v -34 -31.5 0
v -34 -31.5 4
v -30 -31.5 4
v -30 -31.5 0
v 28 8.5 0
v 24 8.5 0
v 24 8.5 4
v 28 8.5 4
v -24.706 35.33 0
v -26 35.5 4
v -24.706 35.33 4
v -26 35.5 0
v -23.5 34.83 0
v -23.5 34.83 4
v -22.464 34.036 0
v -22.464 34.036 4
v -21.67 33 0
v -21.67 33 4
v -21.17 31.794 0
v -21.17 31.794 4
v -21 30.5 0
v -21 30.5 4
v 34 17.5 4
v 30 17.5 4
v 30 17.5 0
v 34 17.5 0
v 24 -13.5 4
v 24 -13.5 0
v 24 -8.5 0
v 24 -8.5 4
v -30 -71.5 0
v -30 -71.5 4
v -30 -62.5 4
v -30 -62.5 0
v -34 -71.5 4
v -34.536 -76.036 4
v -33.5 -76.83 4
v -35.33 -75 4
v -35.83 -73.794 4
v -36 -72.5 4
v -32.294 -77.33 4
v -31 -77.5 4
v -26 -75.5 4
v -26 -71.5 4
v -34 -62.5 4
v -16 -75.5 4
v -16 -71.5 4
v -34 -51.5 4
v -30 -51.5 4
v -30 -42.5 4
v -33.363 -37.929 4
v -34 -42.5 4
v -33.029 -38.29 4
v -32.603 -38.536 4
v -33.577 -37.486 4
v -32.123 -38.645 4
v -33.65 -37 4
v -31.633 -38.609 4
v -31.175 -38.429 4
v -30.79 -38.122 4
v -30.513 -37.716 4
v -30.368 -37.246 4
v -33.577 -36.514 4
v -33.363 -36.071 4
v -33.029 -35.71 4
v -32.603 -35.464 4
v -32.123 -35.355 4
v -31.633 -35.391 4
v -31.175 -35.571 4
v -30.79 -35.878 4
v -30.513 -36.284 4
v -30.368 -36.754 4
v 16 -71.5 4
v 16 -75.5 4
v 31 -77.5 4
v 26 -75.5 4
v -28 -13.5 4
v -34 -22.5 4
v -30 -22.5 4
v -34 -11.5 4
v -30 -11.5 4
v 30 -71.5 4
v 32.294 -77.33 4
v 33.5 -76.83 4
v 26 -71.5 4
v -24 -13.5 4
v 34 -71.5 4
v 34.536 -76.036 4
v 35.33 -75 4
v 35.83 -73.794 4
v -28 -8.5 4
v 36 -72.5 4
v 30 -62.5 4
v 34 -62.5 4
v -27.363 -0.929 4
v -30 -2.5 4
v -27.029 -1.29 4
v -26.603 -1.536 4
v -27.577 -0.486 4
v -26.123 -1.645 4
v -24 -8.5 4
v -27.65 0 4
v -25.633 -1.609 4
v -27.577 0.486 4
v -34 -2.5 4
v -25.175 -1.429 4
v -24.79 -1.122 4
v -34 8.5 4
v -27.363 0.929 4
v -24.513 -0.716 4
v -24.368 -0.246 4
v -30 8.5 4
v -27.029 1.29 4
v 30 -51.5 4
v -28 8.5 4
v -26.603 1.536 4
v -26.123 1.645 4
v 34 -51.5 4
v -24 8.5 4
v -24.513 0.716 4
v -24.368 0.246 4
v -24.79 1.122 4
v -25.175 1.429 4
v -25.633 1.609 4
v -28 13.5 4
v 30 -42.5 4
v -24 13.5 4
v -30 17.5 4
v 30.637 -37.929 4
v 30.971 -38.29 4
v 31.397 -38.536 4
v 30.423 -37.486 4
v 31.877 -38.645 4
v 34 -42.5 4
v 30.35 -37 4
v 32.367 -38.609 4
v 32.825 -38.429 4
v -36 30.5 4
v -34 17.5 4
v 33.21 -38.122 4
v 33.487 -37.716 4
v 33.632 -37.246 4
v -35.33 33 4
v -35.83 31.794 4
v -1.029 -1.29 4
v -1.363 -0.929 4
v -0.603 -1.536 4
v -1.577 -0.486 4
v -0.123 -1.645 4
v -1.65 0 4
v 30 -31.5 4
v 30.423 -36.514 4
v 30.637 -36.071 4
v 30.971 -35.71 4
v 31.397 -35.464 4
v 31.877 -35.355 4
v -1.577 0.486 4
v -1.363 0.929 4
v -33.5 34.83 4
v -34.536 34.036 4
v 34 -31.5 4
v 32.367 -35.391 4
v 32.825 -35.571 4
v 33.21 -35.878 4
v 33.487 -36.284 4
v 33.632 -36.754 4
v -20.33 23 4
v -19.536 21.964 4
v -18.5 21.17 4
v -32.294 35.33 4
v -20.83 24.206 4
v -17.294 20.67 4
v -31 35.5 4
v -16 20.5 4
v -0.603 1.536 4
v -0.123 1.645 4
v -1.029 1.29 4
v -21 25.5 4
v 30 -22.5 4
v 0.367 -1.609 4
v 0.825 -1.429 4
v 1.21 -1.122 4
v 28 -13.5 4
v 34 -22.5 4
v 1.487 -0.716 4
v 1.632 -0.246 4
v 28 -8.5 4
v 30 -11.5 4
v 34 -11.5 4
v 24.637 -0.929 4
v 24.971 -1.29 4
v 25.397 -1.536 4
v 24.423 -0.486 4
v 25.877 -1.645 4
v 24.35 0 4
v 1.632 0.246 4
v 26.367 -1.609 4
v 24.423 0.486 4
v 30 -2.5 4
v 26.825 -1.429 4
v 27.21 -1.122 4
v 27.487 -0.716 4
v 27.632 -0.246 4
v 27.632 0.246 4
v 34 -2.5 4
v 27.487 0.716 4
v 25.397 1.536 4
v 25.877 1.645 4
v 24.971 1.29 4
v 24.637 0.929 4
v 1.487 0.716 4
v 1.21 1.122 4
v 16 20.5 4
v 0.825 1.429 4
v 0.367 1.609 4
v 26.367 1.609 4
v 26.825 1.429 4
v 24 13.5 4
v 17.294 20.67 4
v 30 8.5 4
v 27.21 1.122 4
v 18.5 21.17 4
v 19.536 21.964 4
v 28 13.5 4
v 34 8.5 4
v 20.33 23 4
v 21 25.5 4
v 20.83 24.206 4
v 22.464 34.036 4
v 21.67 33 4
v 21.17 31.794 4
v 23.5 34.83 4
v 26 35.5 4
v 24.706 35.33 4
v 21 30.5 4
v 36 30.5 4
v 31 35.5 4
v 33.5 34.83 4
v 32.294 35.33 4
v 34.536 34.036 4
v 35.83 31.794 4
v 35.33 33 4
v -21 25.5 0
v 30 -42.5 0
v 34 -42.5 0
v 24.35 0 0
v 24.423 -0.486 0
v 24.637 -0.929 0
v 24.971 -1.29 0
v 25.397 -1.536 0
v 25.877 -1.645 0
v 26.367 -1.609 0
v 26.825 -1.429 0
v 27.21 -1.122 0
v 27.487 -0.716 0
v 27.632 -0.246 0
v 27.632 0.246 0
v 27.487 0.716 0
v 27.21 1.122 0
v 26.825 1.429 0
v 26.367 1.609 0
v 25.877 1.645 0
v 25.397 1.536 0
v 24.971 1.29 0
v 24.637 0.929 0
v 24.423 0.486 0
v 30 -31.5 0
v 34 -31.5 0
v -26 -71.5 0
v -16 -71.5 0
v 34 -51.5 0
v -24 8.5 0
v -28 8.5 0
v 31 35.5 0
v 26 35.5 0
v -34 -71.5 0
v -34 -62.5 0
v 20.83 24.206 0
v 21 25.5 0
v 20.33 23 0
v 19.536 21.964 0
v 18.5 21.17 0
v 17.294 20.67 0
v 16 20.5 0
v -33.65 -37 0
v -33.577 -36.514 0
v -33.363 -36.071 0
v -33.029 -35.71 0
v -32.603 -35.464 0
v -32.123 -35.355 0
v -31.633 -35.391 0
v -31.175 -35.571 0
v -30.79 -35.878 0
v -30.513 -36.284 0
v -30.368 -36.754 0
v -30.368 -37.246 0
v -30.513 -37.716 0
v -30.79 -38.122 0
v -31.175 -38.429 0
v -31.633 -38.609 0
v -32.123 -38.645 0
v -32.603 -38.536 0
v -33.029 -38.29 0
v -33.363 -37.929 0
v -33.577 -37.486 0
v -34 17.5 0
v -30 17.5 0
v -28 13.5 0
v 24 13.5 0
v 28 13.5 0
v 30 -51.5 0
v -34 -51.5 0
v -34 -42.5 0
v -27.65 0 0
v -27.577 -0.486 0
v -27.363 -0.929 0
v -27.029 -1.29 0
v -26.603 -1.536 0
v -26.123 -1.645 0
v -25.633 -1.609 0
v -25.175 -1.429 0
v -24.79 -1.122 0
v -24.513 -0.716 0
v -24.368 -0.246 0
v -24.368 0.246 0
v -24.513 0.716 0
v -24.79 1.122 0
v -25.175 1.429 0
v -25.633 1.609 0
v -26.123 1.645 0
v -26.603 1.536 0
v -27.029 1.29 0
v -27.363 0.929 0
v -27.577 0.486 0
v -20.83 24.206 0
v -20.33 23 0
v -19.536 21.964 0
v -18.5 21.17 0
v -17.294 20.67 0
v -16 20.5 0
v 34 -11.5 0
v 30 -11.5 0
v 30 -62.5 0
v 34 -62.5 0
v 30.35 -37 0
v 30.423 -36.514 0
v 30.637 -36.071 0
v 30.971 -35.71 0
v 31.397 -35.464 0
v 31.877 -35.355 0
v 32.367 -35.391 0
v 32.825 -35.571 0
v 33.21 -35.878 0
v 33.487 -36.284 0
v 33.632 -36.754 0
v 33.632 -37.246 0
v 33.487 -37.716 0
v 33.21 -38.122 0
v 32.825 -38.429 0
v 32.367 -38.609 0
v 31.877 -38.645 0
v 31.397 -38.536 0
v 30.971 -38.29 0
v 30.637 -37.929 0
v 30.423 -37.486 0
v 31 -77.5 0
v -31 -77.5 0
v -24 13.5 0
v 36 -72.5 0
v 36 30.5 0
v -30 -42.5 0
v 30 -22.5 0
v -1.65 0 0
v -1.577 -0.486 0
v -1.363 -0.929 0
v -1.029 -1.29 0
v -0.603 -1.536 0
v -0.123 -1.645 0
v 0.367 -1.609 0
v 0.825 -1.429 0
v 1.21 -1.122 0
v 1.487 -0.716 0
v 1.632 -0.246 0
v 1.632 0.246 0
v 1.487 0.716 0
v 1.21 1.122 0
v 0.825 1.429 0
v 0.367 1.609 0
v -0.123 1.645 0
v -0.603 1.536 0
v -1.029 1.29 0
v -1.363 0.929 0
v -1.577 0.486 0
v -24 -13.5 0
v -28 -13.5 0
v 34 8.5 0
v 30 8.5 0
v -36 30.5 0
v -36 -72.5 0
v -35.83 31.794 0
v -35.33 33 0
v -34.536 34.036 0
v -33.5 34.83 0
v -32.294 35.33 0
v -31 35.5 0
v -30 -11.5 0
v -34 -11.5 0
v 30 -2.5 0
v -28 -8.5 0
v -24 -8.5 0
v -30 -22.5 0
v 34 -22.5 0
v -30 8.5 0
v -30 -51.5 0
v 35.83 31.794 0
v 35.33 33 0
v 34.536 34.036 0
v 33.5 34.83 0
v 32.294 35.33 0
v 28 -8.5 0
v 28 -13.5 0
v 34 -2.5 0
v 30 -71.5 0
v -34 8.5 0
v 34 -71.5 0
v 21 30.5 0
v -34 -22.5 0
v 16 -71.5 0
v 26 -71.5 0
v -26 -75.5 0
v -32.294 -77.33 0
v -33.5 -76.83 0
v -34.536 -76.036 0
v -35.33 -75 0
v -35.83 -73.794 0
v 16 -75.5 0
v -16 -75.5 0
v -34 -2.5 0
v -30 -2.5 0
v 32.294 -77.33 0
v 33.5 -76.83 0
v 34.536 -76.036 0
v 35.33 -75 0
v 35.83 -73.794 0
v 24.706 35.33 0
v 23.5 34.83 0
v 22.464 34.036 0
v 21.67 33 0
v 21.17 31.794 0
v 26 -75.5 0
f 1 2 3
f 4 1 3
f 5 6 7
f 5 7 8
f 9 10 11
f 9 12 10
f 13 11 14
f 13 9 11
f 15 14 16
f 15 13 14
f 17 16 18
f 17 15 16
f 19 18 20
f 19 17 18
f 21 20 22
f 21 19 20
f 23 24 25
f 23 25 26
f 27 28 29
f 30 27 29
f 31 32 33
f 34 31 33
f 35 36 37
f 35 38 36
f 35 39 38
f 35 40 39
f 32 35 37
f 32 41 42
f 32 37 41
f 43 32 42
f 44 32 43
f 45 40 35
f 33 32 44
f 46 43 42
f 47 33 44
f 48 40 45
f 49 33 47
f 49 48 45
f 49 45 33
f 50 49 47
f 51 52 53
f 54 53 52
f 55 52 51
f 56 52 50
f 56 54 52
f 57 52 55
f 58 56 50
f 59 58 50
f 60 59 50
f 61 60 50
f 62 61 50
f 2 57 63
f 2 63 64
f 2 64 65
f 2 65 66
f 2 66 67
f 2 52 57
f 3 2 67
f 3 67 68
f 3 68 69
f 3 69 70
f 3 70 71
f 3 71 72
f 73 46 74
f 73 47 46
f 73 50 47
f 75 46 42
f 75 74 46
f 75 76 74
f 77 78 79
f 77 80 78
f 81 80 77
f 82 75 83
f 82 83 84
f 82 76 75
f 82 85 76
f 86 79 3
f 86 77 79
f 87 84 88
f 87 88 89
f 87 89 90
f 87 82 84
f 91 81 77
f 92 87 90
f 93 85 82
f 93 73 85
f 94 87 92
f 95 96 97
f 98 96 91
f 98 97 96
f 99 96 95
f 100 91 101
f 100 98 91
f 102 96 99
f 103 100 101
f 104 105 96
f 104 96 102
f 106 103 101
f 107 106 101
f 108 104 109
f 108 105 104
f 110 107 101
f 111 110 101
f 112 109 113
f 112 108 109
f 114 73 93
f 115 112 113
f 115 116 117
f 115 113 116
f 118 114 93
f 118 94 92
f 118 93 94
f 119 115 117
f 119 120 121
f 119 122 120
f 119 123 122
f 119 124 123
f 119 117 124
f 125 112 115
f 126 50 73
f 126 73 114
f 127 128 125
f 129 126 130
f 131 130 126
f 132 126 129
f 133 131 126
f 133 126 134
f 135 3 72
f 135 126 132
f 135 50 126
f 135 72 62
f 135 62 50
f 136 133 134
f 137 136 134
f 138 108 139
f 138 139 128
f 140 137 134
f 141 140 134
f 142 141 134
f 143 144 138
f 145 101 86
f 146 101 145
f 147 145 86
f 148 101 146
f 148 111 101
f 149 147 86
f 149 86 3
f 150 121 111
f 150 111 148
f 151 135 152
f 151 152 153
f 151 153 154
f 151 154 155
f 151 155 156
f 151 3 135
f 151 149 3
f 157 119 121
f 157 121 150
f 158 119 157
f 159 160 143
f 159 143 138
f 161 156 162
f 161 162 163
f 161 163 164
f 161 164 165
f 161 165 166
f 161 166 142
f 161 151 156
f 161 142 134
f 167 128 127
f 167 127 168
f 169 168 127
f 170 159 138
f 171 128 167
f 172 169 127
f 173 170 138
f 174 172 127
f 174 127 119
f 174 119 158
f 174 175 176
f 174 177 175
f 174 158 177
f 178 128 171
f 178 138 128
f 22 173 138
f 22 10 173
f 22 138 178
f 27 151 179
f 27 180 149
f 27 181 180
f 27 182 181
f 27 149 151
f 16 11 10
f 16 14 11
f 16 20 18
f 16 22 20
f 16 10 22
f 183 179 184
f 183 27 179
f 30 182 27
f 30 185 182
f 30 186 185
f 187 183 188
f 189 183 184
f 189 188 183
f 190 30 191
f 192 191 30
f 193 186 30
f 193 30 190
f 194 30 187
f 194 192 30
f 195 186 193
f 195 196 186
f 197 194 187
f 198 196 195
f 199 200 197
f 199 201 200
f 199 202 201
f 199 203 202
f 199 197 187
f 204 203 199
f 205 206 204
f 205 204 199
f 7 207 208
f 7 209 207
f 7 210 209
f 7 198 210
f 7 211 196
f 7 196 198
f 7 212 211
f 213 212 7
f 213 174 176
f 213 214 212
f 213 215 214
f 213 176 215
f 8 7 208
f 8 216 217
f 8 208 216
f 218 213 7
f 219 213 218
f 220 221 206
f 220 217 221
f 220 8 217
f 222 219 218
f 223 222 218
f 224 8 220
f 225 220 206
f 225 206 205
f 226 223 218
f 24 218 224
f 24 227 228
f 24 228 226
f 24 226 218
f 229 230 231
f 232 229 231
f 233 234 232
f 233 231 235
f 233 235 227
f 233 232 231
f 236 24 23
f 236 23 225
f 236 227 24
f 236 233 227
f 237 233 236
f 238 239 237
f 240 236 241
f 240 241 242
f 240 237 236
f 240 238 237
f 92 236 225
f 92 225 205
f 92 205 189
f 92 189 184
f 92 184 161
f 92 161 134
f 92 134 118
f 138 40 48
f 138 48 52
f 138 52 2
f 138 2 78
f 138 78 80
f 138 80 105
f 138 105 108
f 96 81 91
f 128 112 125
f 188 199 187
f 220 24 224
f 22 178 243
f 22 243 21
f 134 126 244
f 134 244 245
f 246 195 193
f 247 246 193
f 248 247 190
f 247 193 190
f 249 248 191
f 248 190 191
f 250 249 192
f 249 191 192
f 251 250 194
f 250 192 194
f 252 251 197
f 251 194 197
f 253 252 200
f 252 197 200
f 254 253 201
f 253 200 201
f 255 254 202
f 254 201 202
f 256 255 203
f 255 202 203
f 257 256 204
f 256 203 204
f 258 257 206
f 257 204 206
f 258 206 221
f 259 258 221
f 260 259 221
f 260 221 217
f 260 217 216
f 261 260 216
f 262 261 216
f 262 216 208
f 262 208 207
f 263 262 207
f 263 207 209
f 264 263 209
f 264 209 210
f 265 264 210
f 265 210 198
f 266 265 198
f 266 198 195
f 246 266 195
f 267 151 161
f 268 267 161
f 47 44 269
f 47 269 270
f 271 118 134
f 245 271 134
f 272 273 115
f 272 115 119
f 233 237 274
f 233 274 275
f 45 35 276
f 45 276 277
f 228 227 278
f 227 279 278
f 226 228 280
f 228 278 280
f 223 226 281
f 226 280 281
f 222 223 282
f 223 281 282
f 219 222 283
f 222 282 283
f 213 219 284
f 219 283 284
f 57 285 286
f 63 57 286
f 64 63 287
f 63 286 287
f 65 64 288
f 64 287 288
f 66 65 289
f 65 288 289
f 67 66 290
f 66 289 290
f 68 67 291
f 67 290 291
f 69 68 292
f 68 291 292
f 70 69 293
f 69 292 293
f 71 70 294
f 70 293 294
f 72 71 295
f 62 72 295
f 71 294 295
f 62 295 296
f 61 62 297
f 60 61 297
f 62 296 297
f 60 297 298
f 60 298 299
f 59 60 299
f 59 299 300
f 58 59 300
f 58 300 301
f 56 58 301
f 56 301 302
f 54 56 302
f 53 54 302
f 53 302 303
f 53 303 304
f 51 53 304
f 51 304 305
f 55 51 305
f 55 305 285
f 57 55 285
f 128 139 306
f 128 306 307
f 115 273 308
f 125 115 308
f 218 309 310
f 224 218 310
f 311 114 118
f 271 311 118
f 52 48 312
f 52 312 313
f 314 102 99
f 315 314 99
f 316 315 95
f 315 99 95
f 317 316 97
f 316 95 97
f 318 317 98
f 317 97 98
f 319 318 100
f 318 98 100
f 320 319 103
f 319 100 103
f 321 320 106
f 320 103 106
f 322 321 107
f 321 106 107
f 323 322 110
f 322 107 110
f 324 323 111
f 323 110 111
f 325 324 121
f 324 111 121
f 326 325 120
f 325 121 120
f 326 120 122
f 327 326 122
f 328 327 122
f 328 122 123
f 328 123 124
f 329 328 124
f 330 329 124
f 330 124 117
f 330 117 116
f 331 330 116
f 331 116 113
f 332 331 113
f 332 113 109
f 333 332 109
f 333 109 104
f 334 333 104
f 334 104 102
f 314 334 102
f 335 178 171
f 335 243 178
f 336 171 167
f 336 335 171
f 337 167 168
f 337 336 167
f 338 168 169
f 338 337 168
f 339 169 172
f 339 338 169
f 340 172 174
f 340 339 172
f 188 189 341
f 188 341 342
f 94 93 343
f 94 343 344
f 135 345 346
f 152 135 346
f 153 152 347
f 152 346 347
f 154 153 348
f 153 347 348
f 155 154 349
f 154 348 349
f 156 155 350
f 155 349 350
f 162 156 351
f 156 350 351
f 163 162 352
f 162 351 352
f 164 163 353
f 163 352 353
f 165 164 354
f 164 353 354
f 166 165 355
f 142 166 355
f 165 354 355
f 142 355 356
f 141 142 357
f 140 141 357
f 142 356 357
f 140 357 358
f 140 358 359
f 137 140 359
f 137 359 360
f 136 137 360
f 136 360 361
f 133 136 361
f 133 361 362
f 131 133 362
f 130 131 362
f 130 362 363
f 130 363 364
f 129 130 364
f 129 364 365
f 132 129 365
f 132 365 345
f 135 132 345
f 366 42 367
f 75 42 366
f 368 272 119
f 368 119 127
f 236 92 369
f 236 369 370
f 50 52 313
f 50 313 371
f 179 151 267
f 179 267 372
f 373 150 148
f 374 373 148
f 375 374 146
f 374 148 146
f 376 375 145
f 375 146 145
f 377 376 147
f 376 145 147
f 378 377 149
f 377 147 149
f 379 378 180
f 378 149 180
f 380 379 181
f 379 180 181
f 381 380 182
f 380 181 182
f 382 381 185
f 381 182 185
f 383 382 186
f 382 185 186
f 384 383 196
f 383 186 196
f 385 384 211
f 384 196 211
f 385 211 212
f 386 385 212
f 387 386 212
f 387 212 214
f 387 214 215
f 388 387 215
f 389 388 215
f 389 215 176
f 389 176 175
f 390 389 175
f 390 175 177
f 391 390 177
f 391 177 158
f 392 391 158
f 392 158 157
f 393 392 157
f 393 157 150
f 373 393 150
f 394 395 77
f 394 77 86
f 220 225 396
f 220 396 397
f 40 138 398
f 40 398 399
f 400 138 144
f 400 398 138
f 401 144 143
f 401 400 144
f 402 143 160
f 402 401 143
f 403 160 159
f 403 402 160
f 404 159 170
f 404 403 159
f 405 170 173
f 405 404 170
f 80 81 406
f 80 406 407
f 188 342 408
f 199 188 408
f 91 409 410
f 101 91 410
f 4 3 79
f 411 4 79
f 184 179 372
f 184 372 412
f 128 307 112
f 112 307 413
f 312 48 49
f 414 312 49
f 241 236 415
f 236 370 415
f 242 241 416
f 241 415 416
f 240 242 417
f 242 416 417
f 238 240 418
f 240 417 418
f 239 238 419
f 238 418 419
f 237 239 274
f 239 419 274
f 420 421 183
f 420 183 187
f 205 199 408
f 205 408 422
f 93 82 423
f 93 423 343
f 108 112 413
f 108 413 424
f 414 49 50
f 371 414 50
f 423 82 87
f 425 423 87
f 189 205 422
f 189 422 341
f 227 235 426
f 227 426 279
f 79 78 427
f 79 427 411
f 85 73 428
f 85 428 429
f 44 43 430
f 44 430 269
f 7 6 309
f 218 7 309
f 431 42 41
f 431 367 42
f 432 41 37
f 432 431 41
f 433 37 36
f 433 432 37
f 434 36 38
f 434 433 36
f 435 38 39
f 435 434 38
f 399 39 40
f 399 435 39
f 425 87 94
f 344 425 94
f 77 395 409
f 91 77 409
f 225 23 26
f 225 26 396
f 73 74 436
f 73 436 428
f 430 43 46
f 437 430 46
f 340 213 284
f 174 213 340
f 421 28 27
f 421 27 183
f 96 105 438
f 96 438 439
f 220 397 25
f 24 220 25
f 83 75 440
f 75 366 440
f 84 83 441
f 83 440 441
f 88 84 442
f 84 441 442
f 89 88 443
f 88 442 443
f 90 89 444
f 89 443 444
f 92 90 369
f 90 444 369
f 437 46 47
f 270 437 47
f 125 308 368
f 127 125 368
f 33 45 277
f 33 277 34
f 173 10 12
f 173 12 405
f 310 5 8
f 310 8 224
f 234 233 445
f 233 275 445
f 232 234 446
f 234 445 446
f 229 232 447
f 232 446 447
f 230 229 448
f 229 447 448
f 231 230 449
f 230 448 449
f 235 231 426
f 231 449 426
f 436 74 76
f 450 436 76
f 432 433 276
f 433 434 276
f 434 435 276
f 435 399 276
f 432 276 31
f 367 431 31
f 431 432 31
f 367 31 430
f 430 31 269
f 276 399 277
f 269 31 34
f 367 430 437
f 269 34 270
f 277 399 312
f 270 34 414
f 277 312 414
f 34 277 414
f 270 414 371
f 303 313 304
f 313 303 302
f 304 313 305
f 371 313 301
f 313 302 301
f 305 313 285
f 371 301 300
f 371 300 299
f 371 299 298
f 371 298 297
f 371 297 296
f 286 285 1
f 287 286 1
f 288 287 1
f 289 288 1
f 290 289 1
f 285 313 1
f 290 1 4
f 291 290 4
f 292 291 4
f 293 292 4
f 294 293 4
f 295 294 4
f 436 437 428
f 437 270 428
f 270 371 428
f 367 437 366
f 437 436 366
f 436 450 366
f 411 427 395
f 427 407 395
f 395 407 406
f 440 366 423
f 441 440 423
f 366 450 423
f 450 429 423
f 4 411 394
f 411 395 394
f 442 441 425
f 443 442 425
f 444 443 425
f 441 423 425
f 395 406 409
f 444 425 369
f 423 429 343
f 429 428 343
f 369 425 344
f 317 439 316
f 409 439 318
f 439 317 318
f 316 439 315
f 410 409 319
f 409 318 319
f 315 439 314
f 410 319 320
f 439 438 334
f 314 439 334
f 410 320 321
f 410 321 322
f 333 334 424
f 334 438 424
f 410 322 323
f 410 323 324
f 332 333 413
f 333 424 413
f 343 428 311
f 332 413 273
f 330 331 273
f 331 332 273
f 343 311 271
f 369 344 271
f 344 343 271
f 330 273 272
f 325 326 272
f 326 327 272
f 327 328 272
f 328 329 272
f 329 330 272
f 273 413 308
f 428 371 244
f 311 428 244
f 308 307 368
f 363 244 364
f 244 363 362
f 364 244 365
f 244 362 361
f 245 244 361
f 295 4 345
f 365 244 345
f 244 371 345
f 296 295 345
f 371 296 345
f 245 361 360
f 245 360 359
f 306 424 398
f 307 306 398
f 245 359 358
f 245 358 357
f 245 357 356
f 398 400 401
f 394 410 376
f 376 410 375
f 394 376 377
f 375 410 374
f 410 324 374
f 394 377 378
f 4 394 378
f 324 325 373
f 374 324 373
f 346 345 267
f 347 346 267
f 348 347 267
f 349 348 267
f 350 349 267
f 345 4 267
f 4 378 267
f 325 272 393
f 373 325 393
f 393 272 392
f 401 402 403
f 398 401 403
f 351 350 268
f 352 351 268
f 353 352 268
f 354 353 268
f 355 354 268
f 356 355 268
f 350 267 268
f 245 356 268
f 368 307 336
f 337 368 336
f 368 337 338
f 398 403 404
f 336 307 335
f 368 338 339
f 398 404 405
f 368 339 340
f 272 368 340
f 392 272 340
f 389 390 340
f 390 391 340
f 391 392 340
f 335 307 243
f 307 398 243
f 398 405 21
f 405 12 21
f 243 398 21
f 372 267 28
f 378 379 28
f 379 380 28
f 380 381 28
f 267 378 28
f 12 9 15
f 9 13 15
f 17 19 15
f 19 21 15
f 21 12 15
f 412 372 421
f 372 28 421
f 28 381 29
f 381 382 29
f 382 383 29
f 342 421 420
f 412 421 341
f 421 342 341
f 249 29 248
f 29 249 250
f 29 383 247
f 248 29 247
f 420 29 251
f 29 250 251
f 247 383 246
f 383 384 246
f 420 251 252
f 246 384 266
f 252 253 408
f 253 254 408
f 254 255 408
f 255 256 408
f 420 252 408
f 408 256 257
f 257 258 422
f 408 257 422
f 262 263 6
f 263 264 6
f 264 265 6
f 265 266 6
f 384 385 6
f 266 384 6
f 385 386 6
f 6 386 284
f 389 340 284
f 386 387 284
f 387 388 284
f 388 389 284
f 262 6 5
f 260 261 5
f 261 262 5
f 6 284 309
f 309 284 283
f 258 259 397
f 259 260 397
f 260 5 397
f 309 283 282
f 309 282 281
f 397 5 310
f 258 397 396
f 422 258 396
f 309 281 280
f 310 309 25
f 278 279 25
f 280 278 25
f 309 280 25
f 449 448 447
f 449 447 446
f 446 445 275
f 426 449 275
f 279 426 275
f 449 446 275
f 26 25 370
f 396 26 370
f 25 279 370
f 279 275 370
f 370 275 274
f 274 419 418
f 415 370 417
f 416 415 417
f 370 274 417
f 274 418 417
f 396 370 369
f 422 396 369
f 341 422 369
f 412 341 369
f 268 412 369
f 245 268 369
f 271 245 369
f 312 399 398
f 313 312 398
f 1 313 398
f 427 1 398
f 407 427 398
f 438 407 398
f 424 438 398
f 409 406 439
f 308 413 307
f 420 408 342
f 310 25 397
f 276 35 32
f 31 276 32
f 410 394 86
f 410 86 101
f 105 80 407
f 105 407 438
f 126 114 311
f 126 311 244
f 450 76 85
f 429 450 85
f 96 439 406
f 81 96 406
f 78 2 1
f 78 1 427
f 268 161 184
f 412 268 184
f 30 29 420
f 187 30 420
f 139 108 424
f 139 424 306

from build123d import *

# Parameters (mm, degrees)
F0_W     = 4
F0_H     = 5
F1_DEPTH = 4
F2_D     = 3.3
F3_D     = 3.3
F4_W     = 4
F4_H     = 9
F4_W_2   = 10
F4_H_2   = 4
F5_DEPTH = 4
F6_D     = 3.3
F7_R     = 5


with BuildPart() as f1:
    # F0 (on Top) → F1 (new body)
    with BuildSketch(Plane.XY):
        Polygon((18.9080892972, -17.5), (30, -17.5), (30, 17.5), (-30, 17.5), (-30, -17.5), (-18.9080892972, -17.5), (-6.0919107028, -17.5), (6.0919107028, -17.5), align=None)
        with Locations((-26, -11)):
            Rectangle(F0_W, F0_H, mode=Mode.SUBTRACT)
        with Locations((26, -11)):
            Rectangle(F0_W, F0_H, mode=Mode.SUBTRACT)
        with Locations((-26, 11)):
            Rectangle(F0_W, F0_H, mode=Mode.SUBTRACT)
        with Locations((26, 11)):
            Rectangle(F0_W, F0_H, mode=Mode.SUBTRACT)
    extrude(amount=F1_DEPTH)

    # F2 (through all)
    with Locations(Plane(origin=(0, 0, 0), x_dir=(1, 0, 0), z_dir=(0, 0, -1))):
        with Locations((-26, 0), (26, 0)):
            Hole(F2_D / 2)

    # F3 (through all)
    with Locations(Plane(origin=(0, 0, 0), x_dir=(1, 0, 0), z_dir=(0, 0, -1))):
        with Locations((0, 0)):
            Hole(F3_D / 2)

    # F4 (on face) → F5 (join)
    with BuildSketch(Plane.XY.offset(4)):
        Polygon((-36, -77.5), (36, -77.5), (36, 17.5), (36, 35.5), (21, 35.5), (21, 20.5), (0, 20.5), (-21, 20.5), (-21, 35.5), (-36, 35.5), (-36, 17.5), align=None)
        with Locations((-32, -67)):
            Rectangle(F4_W, F4_H, mode=Mode.SUBTRACT)
        with Locations((-21, -73.5)):
            Rectangle(F4_W_2, F4_H_2, mode=Mode.SUBTRACT)
        with Locations((-32, -47)):
            Rectangle(F4_W, F4_H, mode=Mode.SUBTRACT)
        with Locations((-32, -27)):
            Rectangle(F4_W, F4_H, mode=Mode.SUBTRACT)
        with Locations((21, -73.5)):
            Rectangle(F4_W_2, F4_H_2, mode=Mode.SUBTRACT)
        with Locations((32, -67)):
            Rectangle(F4_W, F4_H, mode=Mode.SUBTRACT)
        with Locations((32, -47)):
            Rectangle(F4_W, F4_H, mode=Mode.SUBTRACT)
        with Locations((32, -27)):
            Rectangle(F4_W, F4_H, mode=Mode.SUBTRACT)
        Polygon((-34, 17.5), (-30, 17.5), (30, 17.5), (34, 17.5), (34, 8.5), (30, 8.5), (30, -2.5), (34, -2.5), (34, -11.5), (30, -11.5), (30, -17.5), (-30, -17.5), (-30, -11.5), (-34, -11.5), (-34, -2.5), (-30, -2.5), (-30, 8.5), (-34, 8.5), align=None, mode=Mode.SUBTRACT)
    extrude(amount=-F5_DEPTH)

    # F6 (through all)
    with Locations(Plane.XY.offset(4)):
        with Locations((-32, -37), (32, -37)):
            Hole(F6_D / 2)

    # F7
    f7_edges = [f1.edges().sort_by_distance(p)[0] for p in [
        (-36, -77.5, 2),
        (36, -77.5, 2),
        (-21, 20.5, 2),
        (-21, 35.5, 2),
        (-36, 35.5, 2),
        (21, 35.5, 2),
        (21, 20.5, 2),
        (36, 35.5, 2),
    ]]
    fillet(f7_edges, radius=F7_R)


solid = f1.part
